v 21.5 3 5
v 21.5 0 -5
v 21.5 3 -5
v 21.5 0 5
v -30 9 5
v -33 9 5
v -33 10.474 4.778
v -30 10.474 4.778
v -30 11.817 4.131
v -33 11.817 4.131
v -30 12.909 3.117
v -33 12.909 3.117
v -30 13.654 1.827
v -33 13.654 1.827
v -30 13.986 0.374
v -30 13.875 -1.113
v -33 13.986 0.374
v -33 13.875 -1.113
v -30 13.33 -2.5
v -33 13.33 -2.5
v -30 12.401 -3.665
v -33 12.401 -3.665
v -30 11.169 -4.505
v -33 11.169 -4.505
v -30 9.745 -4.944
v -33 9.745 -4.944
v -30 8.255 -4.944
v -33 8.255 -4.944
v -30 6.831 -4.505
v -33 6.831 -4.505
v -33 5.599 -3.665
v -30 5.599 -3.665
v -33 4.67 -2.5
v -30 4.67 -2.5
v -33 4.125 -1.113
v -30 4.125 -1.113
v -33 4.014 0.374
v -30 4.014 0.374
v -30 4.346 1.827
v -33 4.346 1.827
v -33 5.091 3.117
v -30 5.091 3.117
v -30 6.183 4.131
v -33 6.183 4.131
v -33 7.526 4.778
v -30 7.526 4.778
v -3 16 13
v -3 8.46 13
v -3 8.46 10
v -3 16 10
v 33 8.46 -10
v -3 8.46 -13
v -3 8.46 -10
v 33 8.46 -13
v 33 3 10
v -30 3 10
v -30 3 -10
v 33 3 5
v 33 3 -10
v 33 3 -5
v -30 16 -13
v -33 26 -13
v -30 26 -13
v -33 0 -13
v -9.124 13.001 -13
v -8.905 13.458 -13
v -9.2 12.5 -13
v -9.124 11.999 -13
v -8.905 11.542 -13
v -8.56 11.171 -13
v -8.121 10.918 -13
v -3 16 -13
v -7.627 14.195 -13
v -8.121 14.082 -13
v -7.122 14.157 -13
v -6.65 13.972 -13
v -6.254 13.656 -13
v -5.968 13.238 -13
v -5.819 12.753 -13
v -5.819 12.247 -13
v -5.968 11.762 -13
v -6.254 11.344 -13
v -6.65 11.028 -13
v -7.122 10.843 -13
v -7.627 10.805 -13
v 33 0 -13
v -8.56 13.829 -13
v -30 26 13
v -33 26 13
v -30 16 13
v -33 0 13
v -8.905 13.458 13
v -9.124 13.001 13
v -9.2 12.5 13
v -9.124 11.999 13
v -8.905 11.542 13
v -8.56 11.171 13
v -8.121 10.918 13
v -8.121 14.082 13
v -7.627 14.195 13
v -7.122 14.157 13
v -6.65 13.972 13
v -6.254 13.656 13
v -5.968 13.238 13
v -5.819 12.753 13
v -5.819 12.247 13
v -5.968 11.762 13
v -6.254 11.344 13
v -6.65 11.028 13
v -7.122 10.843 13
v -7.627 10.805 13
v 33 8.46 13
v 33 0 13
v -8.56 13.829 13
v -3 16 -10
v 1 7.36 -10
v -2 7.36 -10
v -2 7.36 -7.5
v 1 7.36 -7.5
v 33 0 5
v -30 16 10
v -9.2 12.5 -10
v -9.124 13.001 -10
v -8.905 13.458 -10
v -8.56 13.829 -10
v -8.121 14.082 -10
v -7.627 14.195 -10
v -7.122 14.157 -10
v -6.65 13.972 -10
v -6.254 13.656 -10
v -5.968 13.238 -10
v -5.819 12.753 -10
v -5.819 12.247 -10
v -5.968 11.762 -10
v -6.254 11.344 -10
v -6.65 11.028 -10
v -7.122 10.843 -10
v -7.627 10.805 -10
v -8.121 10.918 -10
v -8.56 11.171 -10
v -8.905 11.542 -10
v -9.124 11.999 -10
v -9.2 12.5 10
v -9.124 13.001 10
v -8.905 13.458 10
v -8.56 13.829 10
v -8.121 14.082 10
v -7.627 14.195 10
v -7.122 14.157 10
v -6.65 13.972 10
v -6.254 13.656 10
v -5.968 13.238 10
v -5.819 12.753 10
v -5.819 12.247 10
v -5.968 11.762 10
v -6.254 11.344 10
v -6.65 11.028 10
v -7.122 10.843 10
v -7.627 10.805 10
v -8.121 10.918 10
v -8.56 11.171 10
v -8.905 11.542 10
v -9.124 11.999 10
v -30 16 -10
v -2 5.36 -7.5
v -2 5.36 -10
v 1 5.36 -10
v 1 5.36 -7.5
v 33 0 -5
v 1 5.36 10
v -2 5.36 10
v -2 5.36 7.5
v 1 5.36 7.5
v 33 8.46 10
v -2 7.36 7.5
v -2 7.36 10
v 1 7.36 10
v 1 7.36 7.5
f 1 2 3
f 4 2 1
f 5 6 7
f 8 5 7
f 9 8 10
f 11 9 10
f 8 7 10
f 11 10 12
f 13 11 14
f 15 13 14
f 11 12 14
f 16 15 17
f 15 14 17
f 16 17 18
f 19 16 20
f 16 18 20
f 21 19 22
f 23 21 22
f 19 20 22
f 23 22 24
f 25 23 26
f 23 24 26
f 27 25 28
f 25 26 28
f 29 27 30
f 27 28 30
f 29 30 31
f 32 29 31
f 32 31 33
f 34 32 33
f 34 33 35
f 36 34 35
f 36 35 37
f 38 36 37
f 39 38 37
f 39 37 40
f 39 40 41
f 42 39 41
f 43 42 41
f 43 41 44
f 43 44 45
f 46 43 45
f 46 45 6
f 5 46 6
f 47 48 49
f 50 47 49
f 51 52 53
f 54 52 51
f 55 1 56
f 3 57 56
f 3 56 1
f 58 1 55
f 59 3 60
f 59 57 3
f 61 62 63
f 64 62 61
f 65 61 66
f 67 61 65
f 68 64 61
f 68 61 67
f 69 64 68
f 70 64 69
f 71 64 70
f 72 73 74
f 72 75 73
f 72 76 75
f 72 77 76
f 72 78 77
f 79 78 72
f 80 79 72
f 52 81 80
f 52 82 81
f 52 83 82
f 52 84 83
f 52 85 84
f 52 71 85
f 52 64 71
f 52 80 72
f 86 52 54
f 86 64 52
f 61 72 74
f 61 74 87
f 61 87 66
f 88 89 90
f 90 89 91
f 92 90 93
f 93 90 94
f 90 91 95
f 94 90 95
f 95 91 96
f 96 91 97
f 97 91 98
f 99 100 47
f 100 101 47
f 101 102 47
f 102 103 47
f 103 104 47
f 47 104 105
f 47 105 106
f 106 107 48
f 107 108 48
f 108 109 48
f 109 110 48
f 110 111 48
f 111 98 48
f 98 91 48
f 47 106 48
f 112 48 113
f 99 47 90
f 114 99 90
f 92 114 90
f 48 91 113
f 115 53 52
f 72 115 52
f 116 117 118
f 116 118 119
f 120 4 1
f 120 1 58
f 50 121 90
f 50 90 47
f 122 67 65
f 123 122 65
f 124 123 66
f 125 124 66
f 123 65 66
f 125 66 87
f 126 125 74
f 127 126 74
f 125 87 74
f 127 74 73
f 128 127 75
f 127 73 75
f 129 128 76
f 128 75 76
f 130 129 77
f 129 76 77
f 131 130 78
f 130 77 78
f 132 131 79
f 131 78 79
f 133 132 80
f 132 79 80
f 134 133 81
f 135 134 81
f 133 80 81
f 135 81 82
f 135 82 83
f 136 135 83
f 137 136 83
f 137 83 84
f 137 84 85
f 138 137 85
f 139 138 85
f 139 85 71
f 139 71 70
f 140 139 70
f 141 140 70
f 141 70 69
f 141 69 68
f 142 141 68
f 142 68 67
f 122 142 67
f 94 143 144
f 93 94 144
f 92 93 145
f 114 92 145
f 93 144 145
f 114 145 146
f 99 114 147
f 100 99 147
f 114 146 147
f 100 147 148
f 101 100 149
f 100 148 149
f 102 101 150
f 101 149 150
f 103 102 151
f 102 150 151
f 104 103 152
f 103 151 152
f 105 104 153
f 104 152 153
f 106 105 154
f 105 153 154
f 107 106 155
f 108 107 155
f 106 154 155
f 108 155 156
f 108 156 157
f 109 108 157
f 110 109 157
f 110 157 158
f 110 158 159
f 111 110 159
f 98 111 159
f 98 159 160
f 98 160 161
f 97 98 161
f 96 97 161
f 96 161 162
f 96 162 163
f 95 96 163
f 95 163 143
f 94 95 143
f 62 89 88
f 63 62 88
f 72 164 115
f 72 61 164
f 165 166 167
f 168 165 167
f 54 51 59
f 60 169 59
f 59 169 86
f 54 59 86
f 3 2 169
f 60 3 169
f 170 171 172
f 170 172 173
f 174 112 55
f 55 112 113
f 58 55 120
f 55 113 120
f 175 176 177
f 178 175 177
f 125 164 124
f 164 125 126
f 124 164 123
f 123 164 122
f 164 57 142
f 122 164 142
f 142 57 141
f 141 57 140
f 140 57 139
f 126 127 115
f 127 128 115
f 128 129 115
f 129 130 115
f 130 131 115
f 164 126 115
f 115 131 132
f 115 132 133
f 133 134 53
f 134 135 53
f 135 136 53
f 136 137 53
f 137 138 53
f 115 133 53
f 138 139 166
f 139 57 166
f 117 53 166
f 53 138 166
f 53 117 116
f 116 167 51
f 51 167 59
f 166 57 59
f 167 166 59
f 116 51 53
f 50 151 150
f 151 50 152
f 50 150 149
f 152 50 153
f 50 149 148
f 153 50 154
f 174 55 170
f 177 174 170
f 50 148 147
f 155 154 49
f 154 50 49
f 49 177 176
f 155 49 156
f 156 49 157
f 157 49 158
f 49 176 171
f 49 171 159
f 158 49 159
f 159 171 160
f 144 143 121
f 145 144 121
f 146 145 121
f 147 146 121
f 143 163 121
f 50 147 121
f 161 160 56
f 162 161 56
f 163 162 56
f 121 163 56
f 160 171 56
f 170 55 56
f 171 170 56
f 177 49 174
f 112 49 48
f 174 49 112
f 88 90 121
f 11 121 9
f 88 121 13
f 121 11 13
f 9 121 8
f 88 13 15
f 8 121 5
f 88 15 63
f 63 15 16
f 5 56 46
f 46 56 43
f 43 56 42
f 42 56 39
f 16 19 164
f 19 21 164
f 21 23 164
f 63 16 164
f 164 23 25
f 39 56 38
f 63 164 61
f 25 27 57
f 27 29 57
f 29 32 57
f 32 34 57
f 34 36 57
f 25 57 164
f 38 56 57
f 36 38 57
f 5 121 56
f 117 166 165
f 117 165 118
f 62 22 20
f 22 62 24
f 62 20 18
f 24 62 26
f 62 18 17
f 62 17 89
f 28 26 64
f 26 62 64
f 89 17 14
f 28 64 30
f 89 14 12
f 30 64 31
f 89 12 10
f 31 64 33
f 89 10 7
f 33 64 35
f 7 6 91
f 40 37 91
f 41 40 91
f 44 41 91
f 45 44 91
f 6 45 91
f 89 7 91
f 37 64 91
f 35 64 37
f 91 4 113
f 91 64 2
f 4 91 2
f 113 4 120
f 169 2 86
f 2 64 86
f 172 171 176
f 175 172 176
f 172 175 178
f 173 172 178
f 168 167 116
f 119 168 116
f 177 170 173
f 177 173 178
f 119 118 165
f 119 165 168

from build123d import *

# Parameters (mm, degrees)
SKETCH1_W               = 66
SKETCH1_H               = 26
BOSS_EXTRUDE1_DEPTH     = 3
BOSS_EXTRUDE2_START     = 3
BOSS_EXTRUDE2_DEPTH     = 3
BOSS_EXTRUDE3_DEPTH     = 10
BOSS_EXTRUDE4_START     = 10
BOSS_EXTRUDE4_DEPTH     = 10
SKETCH2_4_W             = 36
SKETCH2_4_H             = 3
BOSS_EXTRUDE5_DEPTH     = 2.46
SKETCH3_W               = 3
SKETCH3_H               = 2
BOSS_EXTRUDE6_DEPTH     = 2.5
SKETCH4_W               = 11.5
SKETCH4_H               = 10
CUT_EXTRUDE1_DEPTH      = 1
CUT_EXTRUDE1_DEPTH_BACK = 27
M3_CLEARANCE_HOLE1_D    = 3.4
CUT_EXTRUDE2_REACH      = 68
SKETCH8_R               = 5


with BuildPart() as part:
    # Sketch1 → Boss-Extrude1 (new body)
    with BuildSketch(Plane(origin=(0, 0, 0), x_dir=(1, 0, 0), z_dir=(0, 1, 0))):
        Rectangle(SKETCH1_W, SKETCH1_H)
    extrude(amount=BOSS_EXTRUDE1_DEPTH)

    # Sketch1<3> → Boss-Extrude2 (add)
    with BuildSketch(Plane(origin=(0, 0, 0), x_dir=(1, 0, 0), z_dir=(0, 1, 0)).offset(BOSS_EXTRUDE2_START)):
        Polygon((-30, 10), (30, 10), (33, 10), (33, 13), (-33, 13), (-33, -13), (33, -13), (33, -10), (30, -10), (-30, -10), align=None)
    extrude(amount=BOSS_EXTRUDE2_DEPTH)

    # Sketch2 → Boss-Extrude3 (add)
    with BuildSketch(Plane(origin=(0, 6, 0), x_dir=(1, 0, 0), z_dir=(0, 1, 0))):
        Polygon((-3, 10), (-3, 13), (-33, 13), (-33, -13), (-3, -13), (-3, -10), (-30, -10), (-30, 10), align=None)
    extrude(amount=BOSS_EXTRUDE3_DEPTH)

    # Sketch2<3> → Boss-Extrude4 (add)
    with BuildSketch(Plane(origin=(0, 6, 0), x_dir=(1, 0, 0), z_dir=(0, 1, 0)).offset(BOSS_EXTRUDE4_START)):
        Polygon((-30, 10), (-30, 13), (-33, 13), (-33, -13), (-30, -13), (-30, -10), align=None)
    extrude(amount=BOSS_EXTRUDE4_DEPTH)

    # Sketch2<4> → Boss-Extrude5 (add)
    with BuildSketch(Plane(origin=(0, 6, 0), x_dir=(1, 0, 0), z_dir=(0, 1, 0))):
        with Locations((15, 11.5)):
            Rectangle(SKETCH2_4_W, SKETCH2_4_H)
        with Locations((15, -11.5)):
            Rectangle(SKETCH2_4_W, SKETCH2_4_H)
    extrude(amount=BOSS_EXTRUDE5_DEPTH)

    # Sketch3 → Boss-Extrude6 (add)
    with BuildSketch(Plane.XY.offset(-10)):
        with Locations((-0.5, 6.36)):
            Rectangle(SKETCH3_W, SKETCH3_H)
    boss_extrude6 = extrude(amount=BOSS_EXTRUDE6_DEPTH)

    # Mirror1: Boss-Extrude6 across plane
    add(boss_extrude6.mirror(Plane.XY))

    # Sketch4 → Cut-Extrude1 (cut, two sides)
    with BuildSketch(Plane.XZ) as cut_extrude1_sk:
        with Locations((27.25, 0)):
            Rectangle(SKETCH4_W, SKETCH4_H)
    extrude(amount=CUT_EXTRUDE1_DEPTH, mode=Mode.SUBTRACT)
    extrude(cut_extrude1_sk.sketch, amount=-CUT_EXTRUDE1_DEPTH_BACK, mode=Mode.SUBTRACT)

    # M3 Clearance Hole1 (through all)
    with Locations(Plane.XY.offset(13)):
        with Locations((-7.5, 12.5)):
            Hole(M3_CLEARANCE_HOLE1_D / 2)

    # Sketch8 → Cut-Extrude2 (cut, up to next)
    with BuildSketch(Plane.ZY.offset(33), mode=Mode.PRIVATE) as cut_extrude2_sk1:
        with Locations((0, 9)):
            Circle(SKETCH8_R)
    cut_extrude2_tool1 = extrude(cut_extrude2_sk1.sketch, amount=-CUT_EXTRUDE2_REACH, mode=Mode.PRIVATE) & part.part
    add(cut_extrude2_tool1.solids().sort_by_distance((-33, 9, 0))[0], mode=Mode.SUBTRACT)


solid = part.part
